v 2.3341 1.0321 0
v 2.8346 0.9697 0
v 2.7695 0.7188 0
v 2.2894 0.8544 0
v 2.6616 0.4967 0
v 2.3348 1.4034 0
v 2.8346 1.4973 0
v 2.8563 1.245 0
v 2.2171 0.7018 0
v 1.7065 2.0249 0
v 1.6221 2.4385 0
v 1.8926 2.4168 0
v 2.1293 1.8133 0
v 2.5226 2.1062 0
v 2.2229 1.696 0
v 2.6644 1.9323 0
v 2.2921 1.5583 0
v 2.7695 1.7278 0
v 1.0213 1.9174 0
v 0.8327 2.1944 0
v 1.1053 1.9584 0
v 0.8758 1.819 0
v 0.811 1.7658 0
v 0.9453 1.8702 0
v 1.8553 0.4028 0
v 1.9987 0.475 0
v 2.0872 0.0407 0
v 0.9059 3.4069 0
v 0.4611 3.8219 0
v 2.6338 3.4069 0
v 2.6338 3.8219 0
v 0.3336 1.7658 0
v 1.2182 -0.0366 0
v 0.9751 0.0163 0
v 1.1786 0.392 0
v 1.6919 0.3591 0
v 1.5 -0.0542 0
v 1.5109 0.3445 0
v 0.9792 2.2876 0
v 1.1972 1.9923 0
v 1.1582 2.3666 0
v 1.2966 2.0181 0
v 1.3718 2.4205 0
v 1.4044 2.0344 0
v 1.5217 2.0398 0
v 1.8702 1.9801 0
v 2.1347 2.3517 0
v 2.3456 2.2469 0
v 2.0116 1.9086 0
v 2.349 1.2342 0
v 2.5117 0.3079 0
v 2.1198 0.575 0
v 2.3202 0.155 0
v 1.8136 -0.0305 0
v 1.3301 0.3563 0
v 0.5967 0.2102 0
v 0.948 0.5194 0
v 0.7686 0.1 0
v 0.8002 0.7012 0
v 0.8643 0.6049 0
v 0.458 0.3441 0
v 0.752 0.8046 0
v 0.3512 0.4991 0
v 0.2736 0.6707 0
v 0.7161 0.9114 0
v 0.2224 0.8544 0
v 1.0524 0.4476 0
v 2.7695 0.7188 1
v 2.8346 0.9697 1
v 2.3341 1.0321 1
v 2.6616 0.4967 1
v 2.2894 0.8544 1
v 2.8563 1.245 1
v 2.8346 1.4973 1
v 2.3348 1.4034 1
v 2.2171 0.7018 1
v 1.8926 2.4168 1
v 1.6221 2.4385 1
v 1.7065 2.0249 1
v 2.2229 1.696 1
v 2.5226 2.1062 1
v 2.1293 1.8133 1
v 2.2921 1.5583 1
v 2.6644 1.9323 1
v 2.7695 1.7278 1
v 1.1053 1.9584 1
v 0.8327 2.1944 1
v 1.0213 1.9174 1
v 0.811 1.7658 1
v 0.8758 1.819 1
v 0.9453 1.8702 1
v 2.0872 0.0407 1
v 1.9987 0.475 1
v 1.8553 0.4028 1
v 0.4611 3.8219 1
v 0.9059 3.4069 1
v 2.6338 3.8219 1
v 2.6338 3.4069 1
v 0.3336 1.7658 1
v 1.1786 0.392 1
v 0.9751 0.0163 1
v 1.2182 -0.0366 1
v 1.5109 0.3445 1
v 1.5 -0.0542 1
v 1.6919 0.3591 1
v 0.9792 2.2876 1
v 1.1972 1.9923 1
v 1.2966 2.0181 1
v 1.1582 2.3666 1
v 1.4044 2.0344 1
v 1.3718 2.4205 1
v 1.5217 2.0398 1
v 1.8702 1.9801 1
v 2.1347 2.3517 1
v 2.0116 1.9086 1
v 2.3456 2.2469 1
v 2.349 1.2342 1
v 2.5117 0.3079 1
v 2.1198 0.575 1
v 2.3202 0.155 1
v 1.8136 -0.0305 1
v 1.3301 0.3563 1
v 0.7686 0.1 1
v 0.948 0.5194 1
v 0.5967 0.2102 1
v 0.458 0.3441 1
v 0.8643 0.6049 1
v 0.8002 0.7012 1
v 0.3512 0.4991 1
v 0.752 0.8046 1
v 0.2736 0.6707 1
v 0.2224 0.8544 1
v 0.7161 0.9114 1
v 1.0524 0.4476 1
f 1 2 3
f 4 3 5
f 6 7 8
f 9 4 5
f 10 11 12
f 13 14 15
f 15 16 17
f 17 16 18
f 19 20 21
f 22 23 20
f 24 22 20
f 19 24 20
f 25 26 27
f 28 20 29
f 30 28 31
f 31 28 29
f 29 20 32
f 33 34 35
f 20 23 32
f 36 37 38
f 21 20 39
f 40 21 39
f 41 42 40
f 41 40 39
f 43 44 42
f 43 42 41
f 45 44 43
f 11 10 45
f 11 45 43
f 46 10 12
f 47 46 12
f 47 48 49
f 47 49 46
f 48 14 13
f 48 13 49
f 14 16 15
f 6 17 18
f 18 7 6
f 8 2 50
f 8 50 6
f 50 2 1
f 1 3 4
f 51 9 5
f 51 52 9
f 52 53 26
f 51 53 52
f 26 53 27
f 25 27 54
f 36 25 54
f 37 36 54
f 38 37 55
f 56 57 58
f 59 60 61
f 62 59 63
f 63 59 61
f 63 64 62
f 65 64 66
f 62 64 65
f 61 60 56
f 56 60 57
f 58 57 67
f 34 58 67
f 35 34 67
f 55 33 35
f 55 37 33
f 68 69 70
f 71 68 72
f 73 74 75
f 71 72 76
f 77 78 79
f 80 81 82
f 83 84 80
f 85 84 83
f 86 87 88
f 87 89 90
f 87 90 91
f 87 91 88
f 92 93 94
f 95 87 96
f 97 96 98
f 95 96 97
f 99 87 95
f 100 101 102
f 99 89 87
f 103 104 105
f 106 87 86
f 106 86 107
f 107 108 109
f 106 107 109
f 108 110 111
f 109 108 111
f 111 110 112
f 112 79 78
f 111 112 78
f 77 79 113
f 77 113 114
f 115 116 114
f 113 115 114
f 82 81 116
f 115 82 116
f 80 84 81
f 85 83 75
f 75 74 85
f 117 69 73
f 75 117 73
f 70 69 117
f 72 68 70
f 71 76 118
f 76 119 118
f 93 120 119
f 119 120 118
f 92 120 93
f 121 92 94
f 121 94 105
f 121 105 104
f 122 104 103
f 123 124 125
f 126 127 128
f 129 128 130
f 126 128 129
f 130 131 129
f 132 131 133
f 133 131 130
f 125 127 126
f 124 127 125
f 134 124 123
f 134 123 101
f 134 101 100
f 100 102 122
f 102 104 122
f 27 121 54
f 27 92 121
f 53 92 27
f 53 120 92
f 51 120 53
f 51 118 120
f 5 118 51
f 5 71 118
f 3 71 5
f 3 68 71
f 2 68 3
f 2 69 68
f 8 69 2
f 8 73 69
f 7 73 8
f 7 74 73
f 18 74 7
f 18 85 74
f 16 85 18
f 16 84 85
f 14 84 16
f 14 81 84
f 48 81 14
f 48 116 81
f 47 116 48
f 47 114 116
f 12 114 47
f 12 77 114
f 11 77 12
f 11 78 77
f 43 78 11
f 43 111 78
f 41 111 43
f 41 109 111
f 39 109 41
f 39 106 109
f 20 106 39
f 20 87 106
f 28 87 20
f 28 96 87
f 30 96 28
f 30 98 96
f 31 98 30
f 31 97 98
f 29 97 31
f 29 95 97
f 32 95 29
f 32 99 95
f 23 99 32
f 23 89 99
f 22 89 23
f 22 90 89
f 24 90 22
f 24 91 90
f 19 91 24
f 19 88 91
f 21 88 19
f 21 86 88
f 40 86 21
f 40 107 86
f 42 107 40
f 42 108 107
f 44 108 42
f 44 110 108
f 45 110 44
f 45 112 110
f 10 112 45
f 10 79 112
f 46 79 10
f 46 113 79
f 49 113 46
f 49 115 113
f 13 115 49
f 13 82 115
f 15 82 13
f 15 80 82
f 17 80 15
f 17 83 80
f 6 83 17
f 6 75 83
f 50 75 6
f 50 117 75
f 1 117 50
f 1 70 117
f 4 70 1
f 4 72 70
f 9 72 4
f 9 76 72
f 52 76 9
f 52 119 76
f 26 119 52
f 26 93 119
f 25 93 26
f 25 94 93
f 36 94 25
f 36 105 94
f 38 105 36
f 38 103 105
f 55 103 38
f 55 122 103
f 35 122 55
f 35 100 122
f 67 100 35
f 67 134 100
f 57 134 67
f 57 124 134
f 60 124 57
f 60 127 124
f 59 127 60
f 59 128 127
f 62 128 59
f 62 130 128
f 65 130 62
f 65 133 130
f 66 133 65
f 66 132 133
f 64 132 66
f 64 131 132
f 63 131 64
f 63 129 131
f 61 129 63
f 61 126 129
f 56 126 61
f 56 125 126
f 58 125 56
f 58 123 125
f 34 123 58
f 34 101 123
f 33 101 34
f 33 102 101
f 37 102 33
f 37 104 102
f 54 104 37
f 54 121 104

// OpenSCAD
case_id = 1;
$fn = 12;

if (case_id == 1) {
  linear_extrude(height = 1) text("5", size = 4);
  echo("text extrusion", 5);
}

if (case_id == 2) {
  data = import("language_features_data.json");
  assert(data.name == "reference" && data.size == 2, "JSON import");
  echo("JSON import", data.name, data.size, data.values);
  cube(data.size);
}
